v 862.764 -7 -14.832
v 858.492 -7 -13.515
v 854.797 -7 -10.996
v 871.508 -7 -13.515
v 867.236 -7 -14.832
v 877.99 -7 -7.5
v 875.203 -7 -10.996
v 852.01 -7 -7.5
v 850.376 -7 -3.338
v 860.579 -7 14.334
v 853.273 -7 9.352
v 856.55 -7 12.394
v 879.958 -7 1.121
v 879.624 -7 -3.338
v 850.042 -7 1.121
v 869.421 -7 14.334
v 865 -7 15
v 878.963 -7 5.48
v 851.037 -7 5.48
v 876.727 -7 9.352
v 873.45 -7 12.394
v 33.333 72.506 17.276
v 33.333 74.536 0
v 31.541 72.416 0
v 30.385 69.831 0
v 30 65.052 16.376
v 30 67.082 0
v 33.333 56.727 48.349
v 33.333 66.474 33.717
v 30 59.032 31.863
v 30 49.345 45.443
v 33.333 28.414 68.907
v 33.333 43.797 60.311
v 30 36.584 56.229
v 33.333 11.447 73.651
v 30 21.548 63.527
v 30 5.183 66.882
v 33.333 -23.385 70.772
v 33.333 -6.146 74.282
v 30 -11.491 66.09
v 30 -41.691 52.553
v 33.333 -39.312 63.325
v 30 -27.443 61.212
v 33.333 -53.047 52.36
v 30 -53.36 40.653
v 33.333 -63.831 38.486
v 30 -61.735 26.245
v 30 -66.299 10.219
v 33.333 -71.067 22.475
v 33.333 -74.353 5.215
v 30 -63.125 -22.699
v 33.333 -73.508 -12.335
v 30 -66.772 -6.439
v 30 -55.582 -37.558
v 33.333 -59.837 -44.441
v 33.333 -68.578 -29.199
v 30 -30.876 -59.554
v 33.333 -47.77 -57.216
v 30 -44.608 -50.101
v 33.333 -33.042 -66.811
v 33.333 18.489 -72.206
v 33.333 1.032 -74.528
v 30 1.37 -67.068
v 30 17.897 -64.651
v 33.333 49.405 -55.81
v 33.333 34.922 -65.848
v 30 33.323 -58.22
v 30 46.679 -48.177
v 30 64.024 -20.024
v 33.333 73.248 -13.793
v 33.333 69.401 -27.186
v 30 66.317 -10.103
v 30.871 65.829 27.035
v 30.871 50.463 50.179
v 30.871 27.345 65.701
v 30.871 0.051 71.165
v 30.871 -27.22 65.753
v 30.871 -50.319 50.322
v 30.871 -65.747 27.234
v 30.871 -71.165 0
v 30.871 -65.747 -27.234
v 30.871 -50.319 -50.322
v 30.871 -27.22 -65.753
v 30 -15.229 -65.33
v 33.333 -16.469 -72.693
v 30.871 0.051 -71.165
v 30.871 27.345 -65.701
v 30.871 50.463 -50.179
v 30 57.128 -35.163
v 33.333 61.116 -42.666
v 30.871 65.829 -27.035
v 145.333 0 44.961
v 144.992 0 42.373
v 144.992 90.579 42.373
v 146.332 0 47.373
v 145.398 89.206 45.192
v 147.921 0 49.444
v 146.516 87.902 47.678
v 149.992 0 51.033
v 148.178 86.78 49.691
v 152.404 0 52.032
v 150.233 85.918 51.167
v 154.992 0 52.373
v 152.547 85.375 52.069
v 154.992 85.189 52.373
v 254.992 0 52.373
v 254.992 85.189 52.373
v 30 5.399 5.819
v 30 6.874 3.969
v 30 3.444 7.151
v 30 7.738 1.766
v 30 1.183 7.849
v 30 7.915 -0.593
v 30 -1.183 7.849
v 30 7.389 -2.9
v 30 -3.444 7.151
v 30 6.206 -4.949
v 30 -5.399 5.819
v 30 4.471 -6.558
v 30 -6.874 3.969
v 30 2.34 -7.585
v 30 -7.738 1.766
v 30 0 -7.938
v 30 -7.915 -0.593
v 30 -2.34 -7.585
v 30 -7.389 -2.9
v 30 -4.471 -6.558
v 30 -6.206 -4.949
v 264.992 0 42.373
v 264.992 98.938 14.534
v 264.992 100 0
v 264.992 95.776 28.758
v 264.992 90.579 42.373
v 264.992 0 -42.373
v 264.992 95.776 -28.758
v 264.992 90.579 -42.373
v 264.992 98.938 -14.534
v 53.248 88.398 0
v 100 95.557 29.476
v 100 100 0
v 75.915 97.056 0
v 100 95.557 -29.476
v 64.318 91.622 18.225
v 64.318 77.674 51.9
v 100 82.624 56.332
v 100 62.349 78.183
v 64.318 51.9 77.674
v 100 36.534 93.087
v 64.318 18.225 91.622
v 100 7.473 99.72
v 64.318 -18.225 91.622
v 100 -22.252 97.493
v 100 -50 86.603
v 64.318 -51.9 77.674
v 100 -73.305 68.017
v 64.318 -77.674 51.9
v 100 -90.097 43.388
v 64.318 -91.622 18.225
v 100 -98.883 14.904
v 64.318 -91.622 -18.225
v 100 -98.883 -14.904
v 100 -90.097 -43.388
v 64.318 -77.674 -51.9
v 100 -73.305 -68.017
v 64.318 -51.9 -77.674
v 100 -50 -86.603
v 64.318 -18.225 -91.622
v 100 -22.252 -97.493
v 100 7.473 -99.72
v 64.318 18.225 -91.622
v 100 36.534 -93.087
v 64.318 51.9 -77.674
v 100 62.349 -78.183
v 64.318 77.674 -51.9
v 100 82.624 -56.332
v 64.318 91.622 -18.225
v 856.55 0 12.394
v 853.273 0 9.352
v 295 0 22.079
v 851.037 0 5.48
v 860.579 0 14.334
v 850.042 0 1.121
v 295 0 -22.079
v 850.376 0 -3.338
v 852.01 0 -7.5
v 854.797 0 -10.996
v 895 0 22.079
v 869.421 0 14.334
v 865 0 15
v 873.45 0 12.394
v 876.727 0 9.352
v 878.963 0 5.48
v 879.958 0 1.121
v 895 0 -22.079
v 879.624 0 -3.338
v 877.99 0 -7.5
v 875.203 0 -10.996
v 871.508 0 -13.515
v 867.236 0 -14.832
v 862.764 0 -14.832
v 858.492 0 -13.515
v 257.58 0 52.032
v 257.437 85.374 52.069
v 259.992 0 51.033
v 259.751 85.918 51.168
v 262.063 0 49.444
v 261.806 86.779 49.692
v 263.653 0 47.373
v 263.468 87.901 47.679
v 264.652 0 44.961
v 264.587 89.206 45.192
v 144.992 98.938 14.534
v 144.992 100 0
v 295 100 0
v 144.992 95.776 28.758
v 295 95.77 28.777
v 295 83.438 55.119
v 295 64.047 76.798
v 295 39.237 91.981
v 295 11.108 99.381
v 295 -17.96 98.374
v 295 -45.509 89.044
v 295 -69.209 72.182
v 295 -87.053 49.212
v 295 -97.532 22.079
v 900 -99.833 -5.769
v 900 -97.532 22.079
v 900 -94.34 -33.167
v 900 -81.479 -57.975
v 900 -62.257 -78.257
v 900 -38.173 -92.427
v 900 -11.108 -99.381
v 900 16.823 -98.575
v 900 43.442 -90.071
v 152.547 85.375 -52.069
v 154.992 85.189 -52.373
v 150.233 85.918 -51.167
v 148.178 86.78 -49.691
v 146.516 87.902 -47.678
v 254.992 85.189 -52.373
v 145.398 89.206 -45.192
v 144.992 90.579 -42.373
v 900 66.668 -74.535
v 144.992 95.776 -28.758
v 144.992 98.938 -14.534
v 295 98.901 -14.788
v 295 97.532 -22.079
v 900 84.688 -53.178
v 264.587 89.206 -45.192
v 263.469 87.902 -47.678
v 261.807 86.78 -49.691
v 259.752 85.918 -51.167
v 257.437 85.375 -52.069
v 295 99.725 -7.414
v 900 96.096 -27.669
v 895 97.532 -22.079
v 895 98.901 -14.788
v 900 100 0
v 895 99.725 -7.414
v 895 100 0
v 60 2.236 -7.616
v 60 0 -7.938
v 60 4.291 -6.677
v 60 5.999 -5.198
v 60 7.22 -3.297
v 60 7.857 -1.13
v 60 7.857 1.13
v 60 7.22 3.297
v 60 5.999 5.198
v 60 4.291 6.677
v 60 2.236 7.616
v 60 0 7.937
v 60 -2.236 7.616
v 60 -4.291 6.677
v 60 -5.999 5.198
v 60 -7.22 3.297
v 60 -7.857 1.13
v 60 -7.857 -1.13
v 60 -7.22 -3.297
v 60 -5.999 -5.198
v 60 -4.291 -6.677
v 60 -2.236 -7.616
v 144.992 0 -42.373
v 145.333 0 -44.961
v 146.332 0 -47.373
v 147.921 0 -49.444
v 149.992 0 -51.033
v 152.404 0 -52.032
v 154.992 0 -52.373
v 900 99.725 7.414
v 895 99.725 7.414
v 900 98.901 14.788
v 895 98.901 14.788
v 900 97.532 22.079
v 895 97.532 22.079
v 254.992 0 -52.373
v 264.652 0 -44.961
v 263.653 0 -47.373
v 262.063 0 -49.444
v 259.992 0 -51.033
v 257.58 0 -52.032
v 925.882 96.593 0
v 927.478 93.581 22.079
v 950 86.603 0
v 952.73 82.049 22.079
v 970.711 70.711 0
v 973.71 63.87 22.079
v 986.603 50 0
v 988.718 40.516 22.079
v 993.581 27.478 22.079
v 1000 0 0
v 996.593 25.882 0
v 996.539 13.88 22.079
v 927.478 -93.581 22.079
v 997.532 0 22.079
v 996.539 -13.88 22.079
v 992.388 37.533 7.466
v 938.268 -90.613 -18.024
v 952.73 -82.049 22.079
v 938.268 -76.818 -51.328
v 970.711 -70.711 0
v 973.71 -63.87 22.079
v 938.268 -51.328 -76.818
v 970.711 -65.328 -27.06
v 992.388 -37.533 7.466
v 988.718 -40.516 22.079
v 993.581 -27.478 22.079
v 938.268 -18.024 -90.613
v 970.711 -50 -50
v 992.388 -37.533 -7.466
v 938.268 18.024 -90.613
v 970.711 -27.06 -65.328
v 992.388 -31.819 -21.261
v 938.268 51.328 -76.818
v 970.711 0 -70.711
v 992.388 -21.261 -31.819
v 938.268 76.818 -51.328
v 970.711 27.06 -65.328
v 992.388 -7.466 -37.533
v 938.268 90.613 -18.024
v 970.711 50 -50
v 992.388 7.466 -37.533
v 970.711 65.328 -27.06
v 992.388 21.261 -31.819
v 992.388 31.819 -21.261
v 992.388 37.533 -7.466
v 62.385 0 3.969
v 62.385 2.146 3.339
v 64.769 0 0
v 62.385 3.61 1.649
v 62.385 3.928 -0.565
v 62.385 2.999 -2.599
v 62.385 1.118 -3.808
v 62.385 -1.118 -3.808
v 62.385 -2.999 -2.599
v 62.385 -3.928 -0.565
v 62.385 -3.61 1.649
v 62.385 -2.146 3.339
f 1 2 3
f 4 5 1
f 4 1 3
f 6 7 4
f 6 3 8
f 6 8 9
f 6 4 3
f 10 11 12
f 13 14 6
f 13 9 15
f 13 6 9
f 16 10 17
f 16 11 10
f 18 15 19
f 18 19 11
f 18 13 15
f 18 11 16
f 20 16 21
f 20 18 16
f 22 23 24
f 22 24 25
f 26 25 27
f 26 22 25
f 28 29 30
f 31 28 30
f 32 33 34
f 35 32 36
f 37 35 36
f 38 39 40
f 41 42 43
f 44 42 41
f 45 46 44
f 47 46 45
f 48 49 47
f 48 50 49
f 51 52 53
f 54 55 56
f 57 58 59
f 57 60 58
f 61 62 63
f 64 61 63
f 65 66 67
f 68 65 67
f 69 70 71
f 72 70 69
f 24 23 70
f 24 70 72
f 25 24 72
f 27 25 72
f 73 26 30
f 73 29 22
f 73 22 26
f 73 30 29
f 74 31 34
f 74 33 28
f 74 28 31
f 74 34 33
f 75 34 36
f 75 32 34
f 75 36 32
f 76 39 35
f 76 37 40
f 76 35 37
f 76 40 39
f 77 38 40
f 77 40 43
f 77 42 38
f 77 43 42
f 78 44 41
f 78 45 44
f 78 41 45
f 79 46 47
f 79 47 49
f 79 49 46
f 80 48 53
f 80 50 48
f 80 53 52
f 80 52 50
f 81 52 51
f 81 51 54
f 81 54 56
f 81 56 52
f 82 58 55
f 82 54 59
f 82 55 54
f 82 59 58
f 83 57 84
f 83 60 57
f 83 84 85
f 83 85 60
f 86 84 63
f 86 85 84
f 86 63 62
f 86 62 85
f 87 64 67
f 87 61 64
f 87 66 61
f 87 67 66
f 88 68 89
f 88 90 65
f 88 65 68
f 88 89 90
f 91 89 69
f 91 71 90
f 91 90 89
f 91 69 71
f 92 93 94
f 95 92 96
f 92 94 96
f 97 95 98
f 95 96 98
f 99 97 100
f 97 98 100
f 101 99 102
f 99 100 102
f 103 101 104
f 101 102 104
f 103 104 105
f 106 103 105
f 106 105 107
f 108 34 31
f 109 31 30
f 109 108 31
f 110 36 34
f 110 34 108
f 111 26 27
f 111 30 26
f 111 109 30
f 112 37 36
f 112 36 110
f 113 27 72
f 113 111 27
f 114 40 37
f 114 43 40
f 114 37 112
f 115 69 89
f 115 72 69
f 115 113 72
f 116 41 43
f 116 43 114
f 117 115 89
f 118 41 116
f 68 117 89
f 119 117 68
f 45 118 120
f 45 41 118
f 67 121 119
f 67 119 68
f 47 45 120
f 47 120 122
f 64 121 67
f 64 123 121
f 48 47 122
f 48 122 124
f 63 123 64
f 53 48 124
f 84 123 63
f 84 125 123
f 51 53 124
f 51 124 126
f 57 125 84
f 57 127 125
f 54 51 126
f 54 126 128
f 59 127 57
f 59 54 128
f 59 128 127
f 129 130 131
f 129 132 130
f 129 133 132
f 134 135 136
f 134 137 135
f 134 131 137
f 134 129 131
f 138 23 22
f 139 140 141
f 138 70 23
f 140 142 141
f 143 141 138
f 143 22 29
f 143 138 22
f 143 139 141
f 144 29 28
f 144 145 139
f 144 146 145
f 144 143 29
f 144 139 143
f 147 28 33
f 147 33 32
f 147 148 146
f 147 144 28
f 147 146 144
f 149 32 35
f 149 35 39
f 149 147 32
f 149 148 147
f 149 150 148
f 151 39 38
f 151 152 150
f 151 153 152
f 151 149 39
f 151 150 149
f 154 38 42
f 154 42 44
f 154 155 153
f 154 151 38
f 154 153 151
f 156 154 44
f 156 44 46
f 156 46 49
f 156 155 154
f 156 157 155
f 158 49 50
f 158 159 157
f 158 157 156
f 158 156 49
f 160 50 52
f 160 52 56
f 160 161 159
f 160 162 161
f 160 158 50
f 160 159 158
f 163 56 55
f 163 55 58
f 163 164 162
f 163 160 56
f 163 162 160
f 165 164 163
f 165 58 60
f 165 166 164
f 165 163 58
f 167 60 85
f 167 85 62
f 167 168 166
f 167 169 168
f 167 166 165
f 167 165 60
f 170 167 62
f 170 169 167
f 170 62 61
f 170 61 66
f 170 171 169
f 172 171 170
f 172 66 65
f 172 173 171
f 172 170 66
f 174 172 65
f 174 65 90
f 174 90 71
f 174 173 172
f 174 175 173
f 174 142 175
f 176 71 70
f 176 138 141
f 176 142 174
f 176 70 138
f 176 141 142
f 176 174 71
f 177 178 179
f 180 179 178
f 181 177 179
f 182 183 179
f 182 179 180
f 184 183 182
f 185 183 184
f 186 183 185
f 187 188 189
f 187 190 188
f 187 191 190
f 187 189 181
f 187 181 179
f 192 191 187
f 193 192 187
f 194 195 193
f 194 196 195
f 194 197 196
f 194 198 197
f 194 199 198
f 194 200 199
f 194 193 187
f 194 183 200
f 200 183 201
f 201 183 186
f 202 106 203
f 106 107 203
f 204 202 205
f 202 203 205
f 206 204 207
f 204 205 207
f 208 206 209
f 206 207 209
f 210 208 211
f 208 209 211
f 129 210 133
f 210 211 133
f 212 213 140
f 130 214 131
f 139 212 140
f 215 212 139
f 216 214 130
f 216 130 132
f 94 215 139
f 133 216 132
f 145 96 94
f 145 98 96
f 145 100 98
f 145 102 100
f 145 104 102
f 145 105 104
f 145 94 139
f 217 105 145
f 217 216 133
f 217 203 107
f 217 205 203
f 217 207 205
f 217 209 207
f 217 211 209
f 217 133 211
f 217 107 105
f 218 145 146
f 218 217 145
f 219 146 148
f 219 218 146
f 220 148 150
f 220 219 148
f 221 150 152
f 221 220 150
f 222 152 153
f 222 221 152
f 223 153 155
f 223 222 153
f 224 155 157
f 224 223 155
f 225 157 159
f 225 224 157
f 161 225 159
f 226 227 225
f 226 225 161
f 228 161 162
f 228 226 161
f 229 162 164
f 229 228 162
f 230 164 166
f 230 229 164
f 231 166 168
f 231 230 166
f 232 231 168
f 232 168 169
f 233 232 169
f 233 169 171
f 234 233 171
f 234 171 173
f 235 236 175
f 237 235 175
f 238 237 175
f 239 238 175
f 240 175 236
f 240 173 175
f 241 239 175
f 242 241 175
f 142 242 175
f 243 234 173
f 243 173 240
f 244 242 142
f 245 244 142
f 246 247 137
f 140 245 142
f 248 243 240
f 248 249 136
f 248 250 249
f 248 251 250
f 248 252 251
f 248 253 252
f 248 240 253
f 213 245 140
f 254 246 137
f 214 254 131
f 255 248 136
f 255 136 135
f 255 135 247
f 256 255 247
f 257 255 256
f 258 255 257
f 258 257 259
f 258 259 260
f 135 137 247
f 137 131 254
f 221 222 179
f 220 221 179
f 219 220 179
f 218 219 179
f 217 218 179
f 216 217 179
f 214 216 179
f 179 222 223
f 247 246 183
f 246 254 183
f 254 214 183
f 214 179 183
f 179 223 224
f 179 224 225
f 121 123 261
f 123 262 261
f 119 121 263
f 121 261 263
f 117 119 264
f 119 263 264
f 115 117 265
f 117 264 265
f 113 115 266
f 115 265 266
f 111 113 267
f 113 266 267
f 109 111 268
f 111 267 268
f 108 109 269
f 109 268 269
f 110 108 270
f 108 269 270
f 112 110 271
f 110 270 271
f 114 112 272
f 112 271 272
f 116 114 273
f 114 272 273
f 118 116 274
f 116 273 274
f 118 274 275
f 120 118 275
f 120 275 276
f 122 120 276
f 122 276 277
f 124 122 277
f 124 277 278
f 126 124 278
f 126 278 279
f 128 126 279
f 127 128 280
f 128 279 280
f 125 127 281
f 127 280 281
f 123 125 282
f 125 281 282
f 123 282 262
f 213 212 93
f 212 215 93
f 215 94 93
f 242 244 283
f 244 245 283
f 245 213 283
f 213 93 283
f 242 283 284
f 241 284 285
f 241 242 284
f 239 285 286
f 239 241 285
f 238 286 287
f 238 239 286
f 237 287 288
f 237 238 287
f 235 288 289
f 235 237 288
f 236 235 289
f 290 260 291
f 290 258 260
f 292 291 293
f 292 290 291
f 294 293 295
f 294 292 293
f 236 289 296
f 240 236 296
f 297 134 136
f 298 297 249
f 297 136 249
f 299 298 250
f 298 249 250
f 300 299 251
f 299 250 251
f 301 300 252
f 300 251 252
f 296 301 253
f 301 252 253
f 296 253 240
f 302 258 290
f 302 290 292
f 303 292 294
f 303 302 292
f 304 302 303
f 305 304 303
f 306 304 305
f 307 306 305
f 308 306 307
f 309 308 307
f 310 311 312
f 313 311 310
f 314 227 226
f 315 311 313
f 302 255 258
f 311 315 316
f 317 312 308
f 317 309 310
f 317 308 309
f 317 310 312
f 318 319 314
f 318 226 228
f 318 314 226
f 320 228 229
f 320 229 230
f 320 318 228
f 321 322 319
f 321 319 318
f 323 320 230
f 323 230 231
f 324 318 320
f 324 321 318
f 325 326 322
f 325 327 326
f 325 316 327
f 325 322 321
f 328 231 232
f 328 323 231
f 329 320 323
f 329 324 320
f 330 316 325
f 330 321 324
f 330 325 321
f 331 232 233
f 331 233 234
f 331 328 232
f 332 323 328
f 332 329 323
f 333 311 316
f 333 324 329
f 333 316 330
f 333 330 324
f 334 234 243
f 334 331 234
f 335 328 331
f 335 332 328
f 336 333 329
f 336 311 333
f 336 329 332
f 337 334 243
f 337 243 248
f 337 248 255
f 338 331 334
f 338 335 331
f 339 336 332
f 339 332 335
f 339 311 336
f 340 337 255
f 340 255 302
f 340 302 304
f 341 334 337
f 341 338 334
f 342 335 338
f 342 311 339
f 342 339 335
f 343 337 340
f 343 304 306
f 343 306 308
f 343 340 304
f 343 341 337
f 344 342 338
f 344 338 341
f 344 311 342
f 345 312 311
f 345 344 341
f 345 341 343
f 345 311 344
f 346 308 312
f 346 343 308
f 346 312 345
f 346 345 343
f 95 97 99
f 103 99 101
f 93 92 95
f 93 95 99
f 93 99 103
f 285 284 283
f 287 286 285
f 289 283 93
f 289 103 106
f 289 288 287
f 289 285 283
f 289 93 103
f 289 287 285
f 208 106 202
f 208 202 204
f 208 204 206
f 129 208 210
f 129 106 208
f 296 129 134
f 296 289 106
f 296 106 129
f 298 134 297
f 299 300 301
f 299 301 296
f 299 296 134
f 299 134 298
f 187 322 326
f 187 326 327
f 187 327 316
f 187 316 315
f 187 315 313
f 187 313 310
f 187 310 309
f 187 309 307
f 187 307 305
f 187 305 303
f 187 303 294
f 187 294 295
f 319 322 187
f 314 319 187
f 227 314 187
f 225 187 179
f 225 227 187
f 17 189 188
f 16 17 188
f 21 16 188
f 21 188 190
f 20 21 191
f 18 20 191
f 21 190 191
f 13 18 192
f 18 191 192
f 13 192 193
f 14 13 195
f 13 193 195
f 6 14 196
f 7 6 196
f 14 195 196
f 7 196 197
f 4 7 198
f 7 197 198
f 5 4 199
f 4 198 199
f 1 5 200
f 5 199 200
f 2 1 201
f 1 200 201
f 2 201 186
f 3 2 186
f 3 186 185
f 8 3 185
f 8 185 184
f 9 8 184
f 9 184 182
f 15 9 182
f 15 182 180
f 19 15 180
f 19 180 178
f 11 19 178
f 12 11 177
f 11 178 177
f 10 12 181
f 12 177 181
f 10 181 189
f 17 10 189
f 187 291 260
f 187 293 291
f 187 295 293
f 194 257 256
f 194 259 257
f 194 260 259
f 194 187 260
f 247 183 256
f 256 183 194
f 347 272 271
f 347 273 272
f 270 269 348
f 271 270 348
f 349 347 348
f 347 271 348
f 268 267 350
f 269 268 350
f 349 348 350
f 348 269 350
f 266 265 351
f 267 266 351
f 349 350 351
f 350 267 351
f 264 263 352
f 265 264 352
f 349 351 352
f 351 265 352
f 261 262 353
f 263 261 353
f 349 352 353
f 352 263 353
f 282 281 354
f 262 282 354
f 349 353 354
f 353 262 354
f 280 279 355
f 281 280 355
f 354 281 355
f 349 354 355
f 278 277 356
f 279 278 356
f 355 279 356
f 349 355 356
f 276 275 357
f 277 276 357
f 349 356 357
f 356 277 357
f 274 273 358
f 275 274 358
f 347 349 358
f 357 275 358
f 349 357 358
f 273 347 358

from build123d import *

# Parameters (mm, degrees)
CUT_EXTRUDE7_DEPTH               = 1010.950493836
CUT_EXTRUDE7_DEPTH_BACK          = 1010.950493836
SKETCH13_W                       = 48.176434887
SKETCH13_H                       = 155.804640487
SKETCH4_W                        = 600
SKETCH4_H                        = 44.158972604
CUT_EXTRUDE2_DEPTH               = 1010.950493836
SKETCH7_W                        = 159.807953253
SKETCH7_H                        = 69.49104999
BOSS_EXTRUDE7_DEPTH              = 5
FILLET5_R                        = 10
F_5_8_0_625_DIAMETER_HOLE1_D     = 15.875
F_5_8_0_625_DIAMETER_HOLE1_DEPTH = 30
F_5_8_0_625_DIAMETER_HOLE1_TIP   = 4.769331164
BOSS_EXTRUDE8_DEPTH              = 10
BOSS_EXTRUDE8_DEPTH_BACK         = 10
SKETCH16_W                       = 57.403477863
SKETCH16_H                       = 23.203595883
SKETCH17_W                       = 38.256761469
SKETCH17_H                       = 12.64819079
BOSS_EXTRUDE9_DEPTH              = 10
SKETCH18_W                       = 120
SKETCH18_H                       = 104.74536306
CUT_EXTRUDE8_DEPTH               = 161
FILLET6_R                        = 10
SKETCH19_R                       = 15
CUT_EXTRUDE9_DEPTH               = 7
CUT_EXTRUDE11_DEPTH              = 1010.950493856
CUT_EXTRUDE11_DEPTH_BACK         = 1010.950493856
SKETCH22_W                       = 1481.455902665
SKETCH22_H                       = 524.99926461


# Read off the part's stored shape, not the designer's step: Revolve1
with BuildPart() as part:
    # Revolve1 outline → Revolve1 (revolve)
    with BuildSketch(Plane.YX):
        with BuildLine():
            Line((0, 1000), (0, 0))
            ThreePointArc((0, 0), (70.710678154, 29.289321917), (100, 100.0000001))
            Line((100, 100.0000001), (100, 899.9999999))
            ThreePointArc((100, 899.9999999), (70.710678154, 970.710678083), (0, 1000))
        make_face()
    revolve(axis=Axis((0, 0, 0), (1, 0, 0)))

    # Sketch13 → Cut-Extrude7 (cut, two sides: drawn at the far end of the back side and taken through both)
    with BuildSketch(Plane(origin=(0, 0, 0), x_dir=(1, 0, 0), z_dir=(0, 1, 0)).offset(-CUT_EXTRUDE7_DEPTH_BACK)):
        with Locations((5.911782557, -3.075091589)):
            Rectangle(SKETCH13_W, SKETCH13_H)
    extrude(amount=CUT_EXTRUDE7_DEPTH + CUT_EXTRUDE7_DEPTH_BACK, mode=Mode.SUBTRACT)

    # Sketch4 → Cut-Extrude2 (cut, through all)
    with BuildSketch(Plane(origin=(0, 0, 0), x_dir=(1, 0, 0), z_dir=(0, 1, 0))):
        with Locations((595, 0)):
            Rectangle(SKETCH4_W, SKETCH4_H)
    extrude(amount=CUT_EXTRUDE2_DEPTH, mode=Mode.SUBTRACT)

    # Sketch7 → Boss-Extrude7 (add)
    with BuildSketch(Plane(origin=(0, 0, 0), x_dir=(1, 0, 0), z_dir=(0, 1, 0))):
        with Locations((745.885521462, -1.405844332)):
            Rectangle(SKETCH7_W, SKETCH7_H)
    extrude(amount=-BOSS_EXTRUDE7_DEPTH)

    # Fillet5
    fillet5_edges = [part.edges().sort_by_distance(p)[0] for p in [
        (30, -71.414284286, 0),
    ]]
    fillet(fillet5_edges, radius=FILLET5_R)

    # 5/8 (0.625) Diameter Hole1
    with Locations(Plane.ZY.offset(-30)):
        with Locations((0, 0)):
            Hole(F_5_8_0_625_DIAMETER_HOLE1_D / 2, depth=F_5_8_0_625_DIAMETER_HOLE1_DEPTH)
            with Locations((0, 0, -(F_5_8_0_625_DIAMETER_HOLE1_DEPTH + F_5_8_0_625_DIAMETER_HOLE1_TIP / 2))):  # 118° drill point
                Cone(0, F_5_8_0_625_DIAMETER_HOLE1_D / 2, F_5_8_0_625_DIAMETER_HOLE1_TIP, mode=Mode.SUBTRACT)

    # Sketch16 → Boss-Extrude8 (add, two sides: drawn at the far end of the back side and taken through both)
    with BuildSketch(Plane.XY.offset(-BOSS_EXTRUDE8_DEPTH_BACK)):
        with Locations((738.294537666, -11.601797942)):
            Rectangle(SKETCH16_W, SKETCH16_H)
    extrude(amount=BOSS_EXTRUDE8_DEPTH + BOSS_EXTRUDE8_DEPTH_BACK)

    # Sketch17 → Boss-Extrude9 (add)
    with BuildSketch(Plane.XY.offset(-22.079486302)):
        with Locations((787.071835847, 6.324095395)):
            Rectangle(SKETCH17_W, SKETCH17_H)
    extrude(amount=-BOSS_EXTRUDE9_DEPTH)

    # Sketch18 → Cut-Extrude8 (cut)
    with BuildSketch(Plane(origin=(0, 0, 0), x_dir=(1, 0, 0), z_dir=(0, 1, 0))):
        with Locations((204.992275313, 0)):
            Rectangle(SKETCH18_W, SKETCH18_H)
    extrude(amount=CUT_EXTRUDE8_DEPTH, mode=Mode.SUBTRACT)

    # Fillet6
    fillet6_edges = [part.edges().sort_by_distance(p)[0] for p in [
        (144.992275313, 42.594313674, -52.37268153),
        (144.992275313, 42.594313674, 52.37268153),
        (264.992275313, 42.594313674, 52.37268153),
        (264.992275313, 42.594313674, -52.37268153),
    ]]
    fillet(fillet6_edges, radius=FILLET6_R)

    # Sketch19 → Cut-Extrude9 (cut)
    with BuildSketch(Plane(origin=(0, 0, 0), x_dir=(1, 0, 0), z_dir=(0, 1, 0))):
        with Locations(Location((865, 0, 0), (0, 0, 270))):
            Circle(SKETCH19_R)
    extrude(amount=-CUT_EXTRUDE9_DEPTH, mode=Mode.SUBTRACT)

    # Sketch22 → Cut-Extrude11 (cut, two sides: drawn at the far end of the back side and taken through both)
    with BuildSketch(Plane(origin=(0, 0, 0), x_dir=(1, 0, 0), z_dir=(0, 1, 0)).offset(-CUT_EXTRUDE11_DEPTH_BACK)):
        with Locations((406.155110175, 0)):
            Rectangle(SKETCH22_W, SKETCH22_H)
        Polygon((-101.289974143, 163.942834617), (1092.059469606, 163.942834617), (1092.059469606, -22.079486302), (295, -22.079486302), (295, -179.828704734), (-101.289974143, -179.828704734), (-101.289974143, -22.079486302), align=None, mode=Mode.SUBTRACT)
    extrude(amount=CUT_EXTRUDE11_DEPTH + CUT_EXTRUDE11_DEPTH_BACK, mode=Mode.SUBTRACT)


solid = part.part
